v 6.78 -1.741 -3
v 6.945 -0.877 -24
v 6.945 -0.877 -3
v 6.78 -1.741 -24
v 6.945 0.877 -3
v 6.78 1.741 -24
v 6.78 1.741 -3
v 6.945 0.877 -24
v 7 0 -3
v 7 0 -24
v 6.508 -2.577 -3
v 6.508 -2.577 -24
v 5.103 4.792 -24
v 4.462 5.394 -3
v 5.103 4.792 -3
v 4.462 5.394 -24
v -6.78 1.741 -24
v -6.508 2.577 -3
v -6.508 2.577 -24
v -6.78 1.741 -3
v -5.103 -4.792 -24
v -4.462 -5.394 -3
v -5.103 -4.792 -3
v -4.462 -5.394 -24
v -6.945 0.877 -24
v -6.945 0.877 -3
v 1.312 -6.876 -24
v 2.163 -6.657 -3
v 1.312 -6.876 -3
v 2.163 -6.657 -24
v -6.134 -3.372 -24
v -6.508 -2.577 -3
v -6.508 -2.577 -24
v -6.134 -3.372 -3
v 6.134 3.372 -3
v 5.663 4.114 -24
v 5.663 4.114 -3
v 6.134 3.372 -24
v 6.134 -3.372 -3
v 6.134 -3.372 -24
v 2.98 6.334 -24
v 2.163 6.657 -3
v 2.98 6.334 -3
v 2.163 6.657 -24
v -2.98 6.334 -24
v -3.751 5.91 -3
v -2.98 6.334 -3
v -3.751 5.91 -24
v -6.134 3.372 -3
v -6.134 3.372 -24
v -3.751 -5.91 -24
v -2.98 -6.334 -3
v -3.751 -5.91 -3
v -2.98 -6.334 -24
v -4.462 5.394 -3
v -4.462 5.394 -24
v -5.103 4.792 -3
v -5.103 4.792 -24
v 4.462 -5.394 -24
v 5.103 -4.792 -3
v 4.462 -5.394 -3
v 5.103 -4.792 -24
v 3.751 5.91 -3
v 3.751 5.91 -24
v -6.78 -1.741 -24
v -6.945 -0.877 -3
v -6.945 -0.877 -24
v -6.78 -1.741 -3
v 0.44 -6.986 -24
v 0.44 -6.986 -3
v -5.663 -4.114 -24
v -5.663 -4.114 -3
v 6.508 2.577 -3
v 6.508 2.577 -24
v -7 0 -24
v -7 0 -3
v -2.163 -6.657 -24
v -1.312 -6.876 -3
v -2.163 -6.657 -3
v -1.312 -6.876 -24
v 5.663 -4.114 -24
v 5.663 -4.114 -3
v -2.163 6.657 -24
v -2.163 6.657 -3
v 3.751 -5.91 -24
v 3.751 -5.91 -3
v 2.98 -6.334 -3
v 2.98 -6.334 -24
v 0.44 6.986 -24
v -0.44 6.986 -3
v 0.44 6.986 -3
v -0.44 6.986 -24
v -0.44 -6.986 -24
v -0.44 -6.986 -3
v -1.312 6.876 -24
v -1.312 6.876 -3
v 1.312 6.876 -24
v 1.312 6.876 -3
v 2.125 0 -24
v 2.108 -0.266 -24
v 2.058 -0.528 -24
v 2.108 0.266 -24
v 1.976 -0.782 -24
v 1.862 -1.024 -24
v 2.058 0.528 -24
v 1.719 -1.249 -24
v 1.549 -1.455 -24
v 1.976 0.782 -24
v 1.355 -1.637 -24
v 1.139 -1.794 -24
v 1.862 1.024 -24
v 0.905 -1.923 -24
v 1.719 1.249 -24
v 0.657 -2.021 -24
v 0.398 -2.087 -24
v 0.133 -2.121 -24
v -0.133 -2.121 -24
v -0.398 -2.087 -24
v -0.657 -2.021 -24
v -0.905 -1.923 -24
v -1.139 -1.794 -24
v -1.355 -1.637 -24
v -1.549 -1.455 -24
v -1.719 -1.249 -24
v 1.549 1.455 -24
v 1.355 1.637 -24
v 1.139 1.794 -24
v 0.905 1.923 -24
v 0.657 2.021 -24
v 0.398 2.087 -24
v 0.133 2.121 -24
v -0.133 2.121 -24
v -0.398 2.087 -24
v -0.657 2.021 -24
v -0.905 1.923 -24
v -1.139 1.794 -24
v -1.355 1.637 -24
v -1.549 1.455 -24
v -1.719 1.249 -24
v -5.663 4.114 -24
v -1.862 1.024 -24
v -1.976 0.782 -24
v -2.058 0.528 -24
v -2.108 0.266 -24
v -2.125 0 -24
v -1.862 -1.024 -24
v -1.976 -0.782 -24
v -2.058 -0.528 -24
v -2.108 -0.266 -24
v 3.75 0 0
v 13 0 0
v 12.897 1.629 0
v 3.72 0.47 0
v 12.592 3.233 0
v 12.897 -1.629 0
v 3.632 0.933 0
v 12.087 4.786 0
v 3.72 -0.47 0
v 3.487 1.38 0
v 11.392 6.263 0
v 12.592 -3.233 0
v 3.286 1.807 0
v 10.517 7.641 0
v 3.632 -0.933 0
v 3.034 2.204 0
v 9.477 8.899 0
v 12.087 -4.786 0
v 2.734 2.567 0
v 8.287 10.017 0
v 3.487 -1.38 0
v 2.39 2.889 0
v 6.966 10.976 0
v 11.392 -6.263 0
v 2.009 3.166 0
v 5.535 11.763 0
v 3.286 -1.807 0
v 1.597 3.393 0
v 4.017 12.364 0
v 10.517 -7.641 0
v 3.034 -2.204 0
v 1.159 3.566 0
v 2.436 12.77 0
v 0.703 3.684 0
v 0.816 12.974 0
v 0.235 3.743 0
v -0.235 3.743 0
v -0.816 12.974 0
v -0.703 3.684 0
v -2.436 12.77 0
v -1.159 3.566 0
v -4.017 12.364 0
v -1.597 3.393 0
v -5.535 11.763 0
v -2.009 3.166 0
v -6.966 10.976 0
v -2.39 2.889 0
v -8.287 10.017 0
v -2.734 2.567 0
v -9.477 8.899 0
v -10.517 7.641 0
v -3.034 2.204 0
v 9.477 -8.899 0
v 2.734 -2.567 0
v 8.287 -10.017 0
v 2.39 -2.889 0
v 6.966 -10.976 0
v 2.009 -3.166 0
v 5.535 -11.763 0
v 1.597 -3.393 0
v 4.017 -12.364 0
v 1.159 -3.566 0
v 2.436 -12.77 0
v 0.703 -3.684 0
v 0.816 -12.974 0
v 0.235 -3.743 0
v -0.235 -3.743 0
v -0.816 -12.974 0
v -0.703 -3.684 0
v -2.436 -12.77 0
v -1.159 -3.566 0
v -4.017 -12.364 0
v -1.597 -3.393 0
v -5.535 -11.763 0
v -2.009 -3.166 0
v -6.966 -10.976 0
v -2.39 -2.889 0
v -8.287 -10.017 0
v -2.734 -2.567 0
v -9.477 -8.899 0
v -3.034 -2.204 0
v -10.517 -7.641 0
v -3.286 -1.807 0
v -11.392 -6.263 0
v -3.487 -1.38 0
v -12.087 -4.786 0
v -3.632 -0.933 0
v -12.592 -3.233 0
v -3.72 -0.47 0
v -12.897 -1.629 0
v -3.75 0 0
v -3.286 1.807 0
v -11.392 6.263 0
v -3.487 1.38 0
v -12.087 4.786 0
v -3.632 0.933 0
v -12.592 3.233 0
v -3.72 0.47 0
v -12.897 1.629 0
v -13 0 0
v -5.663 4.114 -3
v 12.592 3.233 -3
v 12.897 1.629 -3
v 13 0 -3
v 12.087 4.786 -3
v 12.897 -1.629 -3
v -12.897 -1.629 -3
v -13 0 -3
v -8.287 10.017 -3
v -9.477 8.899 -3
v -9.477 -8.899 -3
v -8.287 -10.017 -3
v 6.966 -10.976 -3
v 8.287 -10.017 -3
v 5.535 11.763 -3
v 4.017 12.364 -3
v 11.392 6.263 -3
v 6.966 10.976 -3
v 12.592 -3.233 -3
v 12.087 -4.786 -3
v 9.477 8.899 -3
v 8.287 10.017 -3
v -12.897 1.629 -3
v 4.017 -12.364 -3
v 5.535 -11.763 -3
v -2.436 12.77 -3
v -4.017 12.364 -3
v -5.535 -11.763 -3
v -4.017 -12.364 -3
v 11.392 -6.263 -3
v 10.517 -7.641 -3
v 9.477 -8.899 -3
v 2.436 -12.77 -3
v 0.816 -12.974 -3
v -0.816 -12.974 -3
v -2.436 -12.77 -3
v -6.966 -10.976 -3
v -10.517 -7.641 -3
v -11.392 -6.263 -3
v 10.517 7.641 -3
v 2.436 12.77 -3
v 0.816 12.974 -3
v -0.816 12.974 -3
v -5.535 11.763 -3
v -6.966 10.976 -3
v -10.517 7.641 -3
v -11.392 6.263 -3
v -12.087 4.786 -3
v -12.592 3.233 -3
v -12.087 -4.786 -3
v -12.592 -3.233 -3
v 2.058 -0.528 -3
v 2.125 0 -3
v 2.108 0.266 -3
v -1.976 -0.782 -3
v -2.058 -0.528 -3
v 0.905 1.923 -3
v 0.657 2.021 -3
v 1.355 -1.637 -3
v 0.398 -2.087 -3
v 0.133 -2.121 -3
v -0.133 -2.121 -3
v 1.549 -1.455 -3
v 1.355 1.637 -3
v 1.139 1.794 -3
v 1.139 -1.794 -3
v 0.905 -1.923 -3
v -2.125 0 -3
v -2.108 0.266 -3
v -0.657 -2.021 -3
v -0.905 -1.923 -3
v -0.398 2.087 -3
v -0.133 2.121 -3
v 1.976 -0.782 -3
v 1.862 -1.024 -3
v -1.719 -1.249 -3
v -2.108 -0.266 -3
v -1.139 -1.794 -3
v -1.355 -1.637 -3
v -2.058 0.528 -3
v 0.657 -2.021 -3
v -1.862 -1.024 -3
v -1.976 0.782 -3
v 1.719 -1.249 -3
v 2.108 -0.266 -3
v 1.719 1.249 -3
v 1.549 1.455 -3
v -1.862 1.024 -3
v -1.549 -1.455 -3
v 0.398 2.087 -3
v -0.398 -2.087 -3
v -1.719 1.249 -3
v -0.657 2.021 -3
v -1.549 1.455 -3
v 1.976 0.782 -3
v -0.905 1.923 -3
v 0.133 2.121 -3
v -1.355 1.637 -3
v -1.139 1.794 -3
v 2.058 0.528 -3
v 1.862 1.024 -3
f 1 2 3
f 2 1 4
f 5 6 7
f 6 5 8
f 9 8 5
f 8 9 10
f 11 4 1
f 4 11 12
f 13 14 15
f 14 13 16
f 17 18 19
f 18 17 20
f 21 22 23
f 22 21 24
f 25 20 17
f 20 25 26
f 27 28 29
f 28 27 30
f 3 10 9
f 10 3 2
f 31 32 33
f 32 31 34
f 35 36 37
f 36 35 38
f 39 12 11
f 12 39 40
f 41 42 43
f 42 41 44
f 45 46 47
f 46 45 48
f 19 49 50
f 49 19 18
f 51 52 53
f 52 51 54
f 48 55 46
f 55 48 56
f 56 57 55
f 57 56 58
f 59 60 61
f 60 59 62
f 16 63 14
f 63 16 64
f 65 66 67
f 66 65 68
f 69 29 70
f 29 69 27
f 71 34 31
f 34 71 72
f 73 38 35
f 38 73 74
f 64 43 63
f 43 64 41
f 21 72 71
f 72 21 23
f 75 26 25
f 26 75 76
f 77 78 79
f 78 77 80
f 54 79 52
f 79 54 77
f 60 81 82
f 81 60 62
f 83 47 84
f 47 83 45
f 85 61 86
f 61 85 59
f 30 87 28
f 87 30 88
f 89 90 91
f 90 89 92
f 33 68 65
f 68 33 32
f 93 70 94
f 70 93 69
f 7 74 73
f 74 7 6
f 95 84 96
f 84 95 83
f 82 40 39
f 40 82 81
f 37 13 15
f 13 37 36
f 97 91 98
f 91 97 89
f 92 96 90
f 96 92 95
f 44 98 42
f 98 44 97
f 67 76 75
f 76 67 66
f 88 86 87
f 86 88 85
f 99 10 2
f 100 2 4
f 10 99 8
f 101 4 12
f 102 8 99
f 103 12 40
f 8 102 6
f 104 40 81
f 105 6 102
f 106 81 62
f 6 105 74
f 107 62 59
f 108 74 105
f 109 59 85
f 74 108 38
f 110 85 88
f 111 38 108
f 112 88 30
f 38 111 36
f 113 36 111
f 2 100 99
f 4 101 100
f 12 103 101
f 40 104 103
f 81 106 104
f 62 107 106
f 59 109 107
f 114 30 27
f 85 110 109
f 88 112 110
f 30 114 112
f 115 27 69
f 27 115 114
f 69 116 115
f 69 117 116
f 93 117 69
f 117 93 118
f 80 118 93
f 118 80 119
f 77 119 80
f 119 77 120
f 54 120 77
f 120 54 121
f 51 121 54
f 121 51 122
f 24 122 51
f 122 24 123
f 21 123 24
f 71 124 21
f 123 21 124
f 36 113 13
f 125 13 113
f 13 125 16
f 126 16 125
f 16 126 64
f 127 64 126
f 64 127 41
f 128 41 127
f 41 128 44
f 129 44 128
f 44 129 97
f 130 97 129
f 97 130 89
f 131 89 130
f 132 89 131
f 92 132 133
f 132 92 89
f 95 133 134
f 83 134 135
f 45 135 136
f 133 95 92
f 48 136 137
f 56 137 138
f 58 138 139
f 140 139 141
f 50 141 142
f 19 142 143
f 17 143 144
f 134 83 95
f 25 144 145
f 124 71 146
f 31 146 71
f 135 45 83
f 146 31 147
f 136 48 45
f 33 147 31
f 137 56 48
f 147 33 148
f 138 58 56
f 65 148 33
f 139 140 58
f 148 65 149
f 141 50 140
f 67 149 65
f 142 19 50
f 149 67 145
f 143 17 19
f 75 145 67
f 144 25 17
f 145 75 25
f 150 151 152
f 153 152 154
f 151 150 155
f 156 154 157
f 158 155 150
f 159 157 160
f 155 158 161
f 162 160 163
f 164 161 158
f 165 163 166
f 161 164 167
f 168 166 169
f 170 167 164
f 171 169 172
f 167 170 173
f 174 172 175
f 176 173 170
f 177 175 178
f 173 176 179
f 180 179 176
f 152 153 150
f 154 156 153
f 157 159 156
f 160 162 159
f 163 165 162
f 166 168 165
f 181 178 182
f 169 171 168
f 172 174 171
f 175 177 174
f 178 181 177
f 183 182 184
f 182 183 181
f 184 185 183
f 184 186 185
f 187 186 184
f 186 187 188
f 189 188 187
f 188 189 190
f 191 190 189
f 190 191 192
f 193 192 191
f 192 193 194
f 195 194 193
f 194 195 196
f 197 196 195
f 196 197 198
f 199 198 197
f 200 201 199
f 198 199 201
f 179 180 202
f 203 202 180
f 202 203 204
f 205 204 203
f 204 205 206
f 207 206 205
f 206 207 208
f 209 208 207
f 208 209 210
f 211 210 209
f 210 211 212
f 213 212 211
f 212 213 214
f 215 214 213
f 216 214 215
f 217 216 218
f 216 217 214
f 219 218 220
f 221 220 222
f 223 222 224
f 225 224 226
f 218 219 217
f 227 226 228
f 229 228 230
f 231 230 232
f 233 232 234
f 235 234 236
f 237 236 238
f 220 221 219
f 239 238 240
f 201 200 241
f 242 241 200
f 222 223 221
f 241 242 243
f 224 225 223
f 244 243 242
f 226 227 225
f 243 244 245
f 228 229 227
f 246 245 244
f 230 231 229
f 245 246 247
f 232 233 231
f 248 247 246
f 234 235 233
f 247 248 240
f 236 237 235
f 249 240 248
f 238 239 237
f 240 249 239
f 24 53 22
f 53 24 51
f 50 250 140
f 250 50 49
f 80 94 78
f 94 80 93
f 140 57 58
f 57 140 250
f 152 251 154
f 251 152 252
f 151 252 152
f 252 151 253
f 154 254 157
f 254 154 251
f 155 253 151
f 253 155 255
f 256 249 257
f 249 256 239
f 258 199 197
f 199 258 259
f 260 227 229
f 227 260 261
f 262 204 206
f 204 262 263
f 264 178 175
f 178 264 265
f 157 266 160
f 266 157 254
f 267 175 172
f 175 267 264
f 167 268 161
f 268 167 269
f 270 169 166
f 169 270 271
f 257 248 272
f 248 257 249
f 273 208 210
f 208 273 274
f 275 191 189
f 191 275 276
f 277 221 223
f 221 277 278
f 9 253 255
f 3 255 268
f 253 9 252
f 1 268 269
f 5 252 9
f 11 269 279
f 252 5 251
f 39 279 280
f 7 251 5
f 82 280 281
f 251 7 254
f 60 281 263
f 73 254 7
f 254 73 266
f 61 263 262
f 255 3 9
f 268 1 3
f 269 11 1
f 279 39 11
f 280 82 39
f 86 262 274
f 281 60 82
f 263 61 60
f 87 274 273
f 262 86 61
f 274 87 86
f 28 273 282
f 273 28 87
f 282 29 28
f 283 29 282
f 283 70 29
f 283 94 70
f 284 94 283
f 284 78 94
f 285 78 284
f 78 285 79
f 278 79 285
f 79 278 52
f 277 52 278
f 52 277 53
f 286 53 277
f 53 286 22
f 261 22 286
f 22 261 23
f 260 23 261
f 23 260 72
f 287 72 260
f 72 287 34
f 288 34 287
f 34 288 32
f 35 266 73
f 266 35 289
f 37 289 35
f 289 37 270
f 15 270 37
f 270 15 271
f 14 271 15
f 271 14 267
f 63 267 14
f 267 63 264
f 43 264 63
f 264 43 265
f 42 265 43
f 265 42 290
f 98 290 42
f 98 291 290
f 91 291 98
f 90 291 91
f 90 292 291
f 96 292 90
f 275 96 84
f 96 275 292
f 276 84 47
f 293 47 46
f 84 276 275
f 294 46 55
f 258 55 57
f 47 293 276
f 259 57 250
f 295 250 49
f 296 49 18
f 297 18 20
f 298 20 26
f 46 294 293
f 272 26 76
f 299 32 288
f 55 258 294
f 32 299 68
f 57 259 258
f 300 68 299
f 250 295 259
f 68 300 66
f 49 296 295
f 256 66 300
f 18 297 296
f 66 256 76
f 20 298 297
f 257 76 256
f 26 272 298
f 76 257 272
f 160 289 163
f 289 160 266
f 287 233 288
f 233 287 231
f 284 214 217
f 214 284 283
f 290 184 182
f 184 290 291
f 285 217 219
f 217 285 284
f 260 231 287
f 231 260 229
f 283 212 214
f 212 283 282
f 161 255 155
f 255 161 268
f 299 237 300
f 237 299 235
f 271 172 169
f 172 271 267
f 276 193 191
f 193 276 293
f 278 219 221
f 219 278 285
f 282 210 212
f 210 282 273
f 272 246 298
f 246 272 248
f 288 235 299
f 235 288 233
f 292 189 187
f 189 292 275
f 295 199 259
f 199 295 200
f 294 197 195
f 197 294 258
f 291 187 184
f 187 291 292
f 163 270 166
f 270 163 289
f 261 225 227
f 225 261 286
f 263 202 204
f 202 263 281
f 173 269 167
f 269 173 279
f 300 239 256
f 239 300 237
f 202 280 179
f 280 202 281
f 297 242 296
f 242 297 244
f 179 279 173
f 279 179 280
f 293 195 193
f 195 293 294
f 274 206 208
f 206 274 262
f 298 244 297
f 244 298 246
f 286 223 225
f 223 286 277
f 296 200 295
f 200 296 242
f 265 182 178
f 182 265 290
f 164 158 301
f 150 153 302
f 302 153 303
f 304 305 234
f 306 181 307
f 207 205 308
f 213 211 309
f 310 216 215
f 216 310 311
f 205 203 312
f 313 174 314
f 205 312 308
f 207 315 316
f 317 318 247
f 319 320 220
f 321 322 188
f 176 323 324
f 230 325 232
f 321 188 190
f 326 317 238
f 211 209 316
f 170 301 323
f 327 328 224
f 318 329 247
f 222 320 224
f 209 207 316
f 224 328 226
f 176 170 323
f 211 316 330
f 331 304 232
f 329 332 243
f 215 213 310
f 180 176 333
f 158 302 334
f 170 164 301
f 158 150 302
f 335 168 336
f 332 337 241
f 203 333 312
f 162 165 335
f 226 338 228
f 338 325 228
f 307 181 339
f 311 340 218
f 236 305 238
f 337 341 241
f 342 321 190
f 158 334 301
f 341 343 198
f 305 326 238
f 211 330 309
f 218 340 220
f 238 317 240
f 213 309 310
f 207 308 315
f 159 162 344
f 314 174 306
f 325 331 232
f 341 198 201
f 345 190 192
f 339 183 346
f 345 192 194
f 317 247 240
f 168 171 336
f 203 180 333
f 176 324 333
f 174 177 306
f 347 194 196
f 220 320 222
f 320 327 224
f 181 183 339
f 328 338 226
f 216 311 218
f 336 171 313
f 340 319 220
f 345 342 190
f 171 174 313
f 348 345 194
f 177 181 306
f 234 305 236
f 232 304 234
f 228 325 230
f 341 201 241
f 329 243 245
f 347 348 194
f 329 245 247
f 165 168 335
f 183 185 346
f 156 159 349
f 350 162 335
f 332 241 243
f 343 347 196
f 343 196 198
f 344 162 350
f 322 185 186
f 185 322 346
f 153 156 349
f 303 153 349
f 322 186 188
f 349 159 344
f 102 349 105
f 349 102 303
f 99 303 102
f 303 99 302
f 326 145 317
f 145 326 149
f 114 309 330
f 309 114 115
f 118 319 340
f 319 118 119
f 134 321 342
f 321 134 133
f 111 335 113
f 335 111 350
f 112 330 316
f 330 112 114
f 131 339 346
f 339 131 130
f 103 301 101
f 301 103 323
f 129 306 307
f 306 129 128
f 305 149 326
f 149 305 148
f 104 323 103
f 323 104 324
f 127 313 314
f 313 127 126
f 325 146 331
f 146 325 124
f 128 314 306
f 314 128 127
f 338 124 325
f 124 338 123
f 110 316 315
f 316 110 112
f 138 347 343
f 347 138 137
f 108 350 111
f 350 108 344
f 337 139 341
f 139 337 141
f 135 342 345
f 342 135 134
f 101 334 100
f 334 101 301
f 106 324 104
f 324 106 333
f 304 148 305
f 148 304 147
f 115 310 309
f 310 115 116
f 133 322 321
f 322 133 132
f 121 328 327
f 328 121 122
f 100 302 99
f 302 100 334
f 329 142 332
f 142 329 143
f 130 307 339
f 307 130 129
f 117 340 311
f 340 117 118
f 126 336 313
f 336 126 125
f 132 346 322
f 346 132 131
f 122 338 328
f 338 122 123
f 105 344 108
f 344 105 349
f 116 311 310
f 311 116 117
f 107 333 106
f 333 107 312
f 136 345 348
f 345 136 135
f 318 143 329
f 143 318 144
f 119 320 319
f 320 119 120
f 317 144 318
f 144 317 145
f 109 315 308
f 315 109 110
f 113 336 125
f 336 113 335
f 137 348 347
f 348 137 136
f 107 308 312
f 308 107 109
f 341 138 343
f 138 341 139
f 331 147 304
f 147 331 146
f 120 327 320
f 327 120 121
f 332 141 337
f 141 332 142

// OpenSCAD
$fn = 50;


difference() {
	union() {
		translate(v = [0, 0, -24.0000000000]) {
			cylinder(h = 24, r = 7.0000000000);
		}
		translate(v = [0, 0, -3.0000000000]) {
			cylinder(h = 3, r = 13.0000000000);
		}
	}
	union() {
		translate(v = [0, 0, 0]) {
			rotate(a = [0, 0, 0]) {
				difference() {
					union() {
						#translate(v = [0, 0, -24.0000000000]) {
							cylinder(h = 24, r = 2.0000000000);
						}
						#translate(v = [0, 0, -3]) {
							cylinder(h = 3, r1 = 2.1250000000, r2 = 3.7500000000);
						}
						#translate(v = [0, 0, -24.0000000000]) {
							cylinder(h = 24, r = 2.1250000000);
						}
						#translate(v = [0, 0, -24.0000000000]) {
							cylinder(h = 24, r = 2.0000000000);
						}
					}
					union();
				}
			}
		}
	}
}
